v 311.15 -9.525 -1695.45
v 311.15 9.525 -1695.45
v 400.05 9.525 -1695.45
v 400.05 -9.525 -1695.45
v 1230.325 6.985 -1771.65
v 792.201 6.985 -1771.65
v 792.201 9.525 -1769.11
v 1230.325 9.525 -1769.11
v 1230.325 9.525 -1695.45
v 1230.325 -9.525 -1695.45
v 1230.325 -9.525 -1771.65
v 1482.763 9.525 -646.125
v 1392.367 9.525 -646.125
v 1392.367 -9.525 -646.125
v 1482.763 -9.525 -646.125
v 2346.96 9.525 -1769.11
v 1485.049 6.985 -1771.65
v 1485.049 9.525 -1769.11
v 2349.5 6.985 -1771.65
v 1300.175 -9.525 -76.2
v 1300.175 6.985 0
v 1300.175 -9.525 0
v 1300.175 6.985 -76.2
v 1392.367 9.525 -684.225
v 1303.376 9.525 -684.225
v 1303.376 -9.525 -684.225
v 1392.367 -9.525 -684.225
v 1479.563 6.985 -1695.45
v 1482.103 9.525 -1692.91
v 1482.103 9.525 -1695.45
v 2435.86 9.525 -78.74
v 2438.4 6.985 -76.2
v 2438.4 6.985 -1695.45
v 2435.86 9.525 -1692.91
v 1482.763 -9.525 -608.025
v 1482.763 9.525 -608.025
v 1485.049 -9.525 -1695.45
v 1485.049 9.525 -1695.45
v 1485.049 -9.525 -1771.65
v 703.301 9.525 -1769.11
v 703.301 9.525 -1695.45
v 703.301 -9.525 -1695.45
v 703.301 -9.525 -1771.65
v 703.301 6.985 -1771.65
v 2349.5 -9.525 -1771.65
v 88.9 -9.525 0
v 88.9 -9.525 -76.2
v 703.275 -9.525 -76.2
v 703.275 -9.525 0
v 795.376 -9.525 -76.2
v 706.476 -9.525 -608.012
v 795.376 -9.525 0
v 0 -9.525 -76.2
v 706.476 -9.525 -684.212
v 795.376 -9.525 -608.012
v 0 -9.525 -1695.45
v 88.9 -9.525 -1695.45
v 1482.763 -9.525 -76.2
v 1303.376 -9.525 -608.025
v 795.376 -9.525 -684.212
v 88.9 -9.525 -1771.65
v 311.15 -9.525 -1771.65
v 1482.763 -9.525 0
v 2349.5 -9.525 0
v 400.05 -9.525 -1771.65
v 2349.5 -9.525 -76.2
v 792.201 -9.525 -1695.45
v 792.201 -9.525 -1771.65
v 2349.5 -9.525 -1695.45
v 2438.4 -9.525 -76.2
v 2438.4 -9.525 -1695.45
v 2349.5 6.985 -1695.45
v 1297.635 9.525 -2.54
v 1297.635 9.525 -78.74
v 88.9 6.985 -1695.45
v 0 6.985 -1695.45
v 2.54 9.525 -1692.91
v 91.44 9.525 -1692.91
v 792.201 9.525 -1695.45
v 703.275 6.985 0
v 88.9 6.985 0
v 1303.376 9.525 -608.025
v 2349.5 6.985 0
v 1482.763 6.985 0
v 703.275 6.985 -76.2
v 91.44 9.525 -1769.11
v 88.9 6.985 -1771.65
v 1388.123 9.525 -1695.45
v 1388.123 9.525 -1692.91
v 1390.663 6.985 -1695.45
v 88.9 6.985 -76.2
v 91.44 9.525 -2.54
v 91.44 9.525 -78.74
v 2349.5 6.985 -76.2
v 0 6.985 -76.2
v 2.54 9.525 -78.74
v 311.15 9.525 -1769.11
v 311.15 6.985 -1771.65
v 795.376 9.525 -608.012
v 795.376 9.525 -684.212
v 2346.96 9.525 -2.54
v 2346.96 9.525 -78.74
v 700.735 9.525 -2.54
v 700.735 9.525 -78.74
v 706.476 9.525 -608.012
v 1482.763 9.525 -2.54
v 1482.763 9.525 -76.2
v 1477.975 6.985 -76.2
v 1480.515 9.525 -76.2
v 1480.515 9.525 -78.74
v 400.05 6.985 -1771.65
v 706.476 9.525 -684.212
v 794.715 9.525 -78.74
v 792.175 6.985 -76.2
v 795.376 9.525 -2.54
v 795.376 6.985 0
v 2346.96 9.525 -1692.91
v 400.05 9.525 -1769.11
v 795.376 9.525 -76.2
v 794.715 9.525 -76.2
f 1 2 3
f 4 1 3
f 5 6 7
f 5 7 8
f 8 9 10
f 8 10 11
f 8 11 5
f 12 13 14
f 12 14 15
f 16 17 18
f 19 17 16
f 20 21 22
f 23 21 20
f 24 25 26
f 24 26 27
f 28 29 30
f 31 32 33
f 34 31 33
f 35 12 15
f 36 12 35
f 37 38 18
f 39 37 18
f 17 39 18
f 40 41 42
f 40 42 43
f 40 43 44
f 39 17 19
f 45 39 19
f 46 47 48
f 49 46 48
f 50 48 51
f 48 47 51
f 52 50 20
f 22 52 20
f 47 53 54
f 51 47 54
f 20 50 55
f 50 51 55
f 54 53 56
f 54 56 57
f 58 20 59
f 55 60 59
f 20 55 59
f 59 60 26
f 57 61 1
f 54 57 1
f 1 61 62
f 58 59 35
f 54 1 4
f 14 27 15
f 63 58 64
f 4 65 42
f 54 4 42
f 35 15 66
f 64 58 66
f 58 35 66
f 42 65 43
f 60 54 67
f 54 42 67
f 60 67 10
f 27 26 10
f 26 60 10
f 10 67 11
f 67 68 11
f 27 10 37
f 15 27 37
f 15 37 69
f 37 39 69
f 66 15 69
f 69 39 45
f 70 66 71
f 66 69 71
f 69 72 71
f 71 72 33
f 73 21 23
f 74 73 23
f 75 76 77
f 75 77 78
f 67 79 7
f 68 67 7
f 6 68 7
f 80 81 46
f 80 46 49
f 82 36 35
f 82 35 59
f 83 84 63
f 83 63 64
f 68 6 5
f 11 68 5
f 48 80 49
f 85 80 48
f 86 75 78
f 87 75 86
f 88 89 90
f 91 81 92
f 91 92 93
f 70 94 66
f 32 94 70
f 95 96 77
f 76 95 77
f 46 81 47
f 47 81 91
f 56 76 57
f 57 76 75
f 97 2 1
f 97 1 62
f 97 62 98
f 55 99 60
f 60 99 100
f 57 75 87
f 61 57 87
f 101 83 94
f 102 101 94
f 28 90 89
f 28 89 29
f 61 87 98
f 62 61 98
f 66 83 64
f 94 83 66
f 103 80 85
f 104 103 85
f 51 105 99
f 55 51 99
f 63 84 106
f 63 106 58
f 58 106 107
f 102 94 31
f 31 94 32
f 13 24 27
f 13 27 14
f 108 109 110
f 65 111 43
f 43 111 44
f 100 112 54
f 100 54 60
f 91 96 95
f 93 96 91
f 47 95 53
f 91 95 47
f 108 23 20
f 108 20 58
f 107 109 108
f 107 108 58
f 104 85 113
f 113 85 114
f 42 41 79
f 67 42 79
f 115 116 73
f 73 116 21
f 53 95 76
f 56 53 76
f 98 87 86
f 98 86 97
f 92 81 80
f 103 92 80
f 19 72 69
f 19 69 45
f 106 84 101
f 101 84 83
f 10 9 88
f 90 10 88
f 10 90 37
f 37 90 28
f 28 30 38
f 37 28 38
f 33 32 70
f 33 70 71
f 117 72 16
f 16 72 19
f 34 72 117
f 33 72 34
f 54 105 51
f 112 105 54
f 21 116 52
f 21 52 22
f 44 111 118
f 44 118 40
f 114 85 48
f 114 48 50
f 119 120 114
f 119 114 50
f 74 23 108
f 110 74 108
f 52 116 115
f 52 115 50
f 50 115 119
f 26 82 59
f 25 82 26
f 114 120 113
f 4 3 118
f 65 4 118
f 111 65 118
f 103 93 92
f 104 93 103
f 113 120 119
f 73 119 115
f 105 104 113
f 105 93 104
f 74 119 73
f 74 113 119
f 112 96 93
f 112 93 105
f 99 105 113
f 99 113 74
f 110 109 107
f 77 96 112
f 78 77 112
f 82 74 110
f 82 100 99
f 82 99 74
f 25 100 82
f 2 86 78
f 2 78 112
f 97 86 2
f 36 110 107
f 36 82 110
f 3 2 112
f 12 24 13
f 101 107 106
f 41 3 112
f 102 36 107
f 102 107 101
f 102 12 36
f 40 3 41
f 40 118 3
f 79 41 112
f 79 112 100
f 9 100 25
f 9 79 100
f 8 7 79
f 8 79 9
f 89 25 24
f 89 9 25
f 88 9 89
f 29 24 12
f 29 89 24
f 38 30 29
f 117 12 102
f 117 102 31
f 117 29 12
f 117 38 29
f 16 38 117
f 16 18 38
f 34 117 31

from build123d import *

# Parameters (mm, degrees)
SKETCH1_W           = 2438.4
SKETCH1_H           = 1771.65
BOSS_EXTRUDE1_DEPTH = 9.525
SKETCH2_W           = 88.9
SKETCH2_H           = 76.2
SKETCH2_W_2         = 177.8
CUT_EXTRUDE1_DEPTH  = 20.05
CHAMFER1_SIZE       = 2.54
SKETCH4_W           = 88.9
SKETCH4_H           = 76.2
CUT_EXTRUDE2_DEPTH  = 20.05
SKETCH5_W           = 88.9
SKETCH5_H           = 76.2
SKETCH5_W_2         = 254.7239
SKETCH5_W_3         = 92.1004
SKETCH5_W_4         = 179.3875
CUT_EXTRUDE3_DEPTH  = 20.05


with BuildPart() as part:
    # Sketch1 → Boss-Extrude1 (new body, symmetric)
    with BuildSketch(Plane(origin=(0, 0, 0), x_dir=(1, 0, 0), z_dir=(0, 1, 0))):
        with Locations((1219.2, 885.825)):
            Rectangle(SKETCH1_W, SKETCH1_H)
    extrude(amount=BOSS_EXTRUDE1_DEPTH, both=True)

    # Sketch2 → Cut-Extrude1 (cut, through all)
    with BuildSketch(Plane(origin=(0, 9.525, 0), x_dir=(1, 0, 0), z_dir=(0, 1, 0))):
        with Locations((1435.1127, 1733.55)):
            Rectangle(SKETCH2_W, SKETCH2_H)
        with Locations((44.45, 1733.55)):
            Rectangle(SKETCH2_W, SKETCH2_H)
        with Locations((2393.95, 1733.55)):
            Rectangle(SKETCH2_W, SKETCH2_H)
        with Locations((1389.0752, 38.1)):
            Rectangle(SKETCH2_W_2, SKETCH2_H)
        with Locations((747.7252, 38.1)):
            Rectangle(SKETCH2_W, SKETCH2_H)
        with Locations((2393.95, 38.1)):
            Rectangle(SKETCH2_W, SKETCH2_H)
        with Locations((44.45, 38.1)):
            Rectangle(SKETCH2_W, SKETCH2_H)
    extrude(amount=-CUT_EXTRUDE1_DEPTH, mode=Mode.SUBTRACT)

    # Chamfer1
    chamfer1_edges = [part.edges().sort_by_distance(p)[0] for p in [
        (0, 9.525, -885.825),
        (396.0876, 9.525, 0),
        (1046.1752, 9.525, 0),
        (1913.7376, 9.525, 0),
        (2438.4, 9.525, -885.825),
        (1914.53135, 9.525, -1771.65),
        (739.78135, 9.525, -1771.65),
        (2393.95, 9.525, -76.2),
        (2349.5, 9.525, -38.1),
        (792.1752, 9.525, -38.1),
        (747.7252, 9.525, -76.2),
        (703.2752, 9.525, -38.1),
        (1477.9752, 9.525, -38.1),
        (1389.0752, 9.525, -76.2),
        (1300.1752, 9.525, -38.1),
        (2349.5, 9.525, -1733.55),
        (2393.95, 9.525, -1695.45),
        (1390.6627, 9.525, -1733.55),
        (1435.1127, 9.525, -1695.45),
        (1479.5627, 9.525, -1733.55),
        (88.9, 9.525, -38.1),
        (44.45, 9.525, -76.2),
        (44.45, 9.525, -1695.45),
        (88.9, 9.525, -1733.55),
    ]]
    chamfer(chamfer1_edges, length=CHAMFER1_SIZE)

    # Sketch4 → Cut-Extrude2 (cut, through all)
    with BuildSketch(Plane(origin=(0, 9.525, 0), x_dir=(1, 0, 0), z_dir=(0, 1, 0))):
        with Locations((355.6, 1733.55)):
            Rectangle(SKETCH4_W, SKETCH4_H)
        with Locations((1274.7752, 1733.55)):
            Rectangle(SKETCH4_W, SKETCH4_H)
    extrude(amount=-CUT_EXTRUDE2_DEPTH, mode=Mode.SUBTRACT)

    # Sketch5 → Cut-Extrude3 (cut, through all)
    with BuildSketch(Plane(origin=(0, 9.525, 0), x_dir=(1, 0, 0), z_dir=(0, 1, 0))):
        with Locations((44.45, 1733.55)):
            Rectangle(SKETCH5_W, SKETCH5_H)
        with Locations((355.6, 1733.55)):
            Rectangle(SKETCH5_W, SKETCH5_H)
        with Locations((747.7506, 1733.55)):
            Rectangle(SKETCH5_W, SKETCH5_H)
        with Locations((1357.68715, 1733.55)):
            Rectangle(SKETCH5_W_2, SKETCH5_H)
        with Locations((2393.95, 1733.55)):
            Rectangle(SKETCH5_W, SKETCH5_H)
        with Locations((750.9256, 646.112499999)):
            Rectangle(SKETCH5_W, SKETCH5_H)
        Polygon((1303.3756, 684.225199999), (1392.367165563, 684.225199999), (1392.367165563, 646.125199999), (1482.7631, 646.125199999), (1482.7631, 608.025199999), (1303.3756, 608.025199999), align=None)
        with Locations((44.45, 38.1)):
            Rectangle(SKETCH5_W, SKETCH5_H)
        with Locations((749.3254, 38.1)):
            Rectangle(SKETCH5_W_3, SKETCH5_H)
        with Locations((1393.06935, 38.1)):
            Rectangle(SKETCH5_W_4, SKETCH5_H)
        with Locations((2393.95, 38.1)):
            Rectangle(SKETCH5_W, SKETCH5_H)
    extrude(amount=-CUT_EXTRUDE3_DEPTH, mode=Mode.SUBTRACT)


solid = part.part
